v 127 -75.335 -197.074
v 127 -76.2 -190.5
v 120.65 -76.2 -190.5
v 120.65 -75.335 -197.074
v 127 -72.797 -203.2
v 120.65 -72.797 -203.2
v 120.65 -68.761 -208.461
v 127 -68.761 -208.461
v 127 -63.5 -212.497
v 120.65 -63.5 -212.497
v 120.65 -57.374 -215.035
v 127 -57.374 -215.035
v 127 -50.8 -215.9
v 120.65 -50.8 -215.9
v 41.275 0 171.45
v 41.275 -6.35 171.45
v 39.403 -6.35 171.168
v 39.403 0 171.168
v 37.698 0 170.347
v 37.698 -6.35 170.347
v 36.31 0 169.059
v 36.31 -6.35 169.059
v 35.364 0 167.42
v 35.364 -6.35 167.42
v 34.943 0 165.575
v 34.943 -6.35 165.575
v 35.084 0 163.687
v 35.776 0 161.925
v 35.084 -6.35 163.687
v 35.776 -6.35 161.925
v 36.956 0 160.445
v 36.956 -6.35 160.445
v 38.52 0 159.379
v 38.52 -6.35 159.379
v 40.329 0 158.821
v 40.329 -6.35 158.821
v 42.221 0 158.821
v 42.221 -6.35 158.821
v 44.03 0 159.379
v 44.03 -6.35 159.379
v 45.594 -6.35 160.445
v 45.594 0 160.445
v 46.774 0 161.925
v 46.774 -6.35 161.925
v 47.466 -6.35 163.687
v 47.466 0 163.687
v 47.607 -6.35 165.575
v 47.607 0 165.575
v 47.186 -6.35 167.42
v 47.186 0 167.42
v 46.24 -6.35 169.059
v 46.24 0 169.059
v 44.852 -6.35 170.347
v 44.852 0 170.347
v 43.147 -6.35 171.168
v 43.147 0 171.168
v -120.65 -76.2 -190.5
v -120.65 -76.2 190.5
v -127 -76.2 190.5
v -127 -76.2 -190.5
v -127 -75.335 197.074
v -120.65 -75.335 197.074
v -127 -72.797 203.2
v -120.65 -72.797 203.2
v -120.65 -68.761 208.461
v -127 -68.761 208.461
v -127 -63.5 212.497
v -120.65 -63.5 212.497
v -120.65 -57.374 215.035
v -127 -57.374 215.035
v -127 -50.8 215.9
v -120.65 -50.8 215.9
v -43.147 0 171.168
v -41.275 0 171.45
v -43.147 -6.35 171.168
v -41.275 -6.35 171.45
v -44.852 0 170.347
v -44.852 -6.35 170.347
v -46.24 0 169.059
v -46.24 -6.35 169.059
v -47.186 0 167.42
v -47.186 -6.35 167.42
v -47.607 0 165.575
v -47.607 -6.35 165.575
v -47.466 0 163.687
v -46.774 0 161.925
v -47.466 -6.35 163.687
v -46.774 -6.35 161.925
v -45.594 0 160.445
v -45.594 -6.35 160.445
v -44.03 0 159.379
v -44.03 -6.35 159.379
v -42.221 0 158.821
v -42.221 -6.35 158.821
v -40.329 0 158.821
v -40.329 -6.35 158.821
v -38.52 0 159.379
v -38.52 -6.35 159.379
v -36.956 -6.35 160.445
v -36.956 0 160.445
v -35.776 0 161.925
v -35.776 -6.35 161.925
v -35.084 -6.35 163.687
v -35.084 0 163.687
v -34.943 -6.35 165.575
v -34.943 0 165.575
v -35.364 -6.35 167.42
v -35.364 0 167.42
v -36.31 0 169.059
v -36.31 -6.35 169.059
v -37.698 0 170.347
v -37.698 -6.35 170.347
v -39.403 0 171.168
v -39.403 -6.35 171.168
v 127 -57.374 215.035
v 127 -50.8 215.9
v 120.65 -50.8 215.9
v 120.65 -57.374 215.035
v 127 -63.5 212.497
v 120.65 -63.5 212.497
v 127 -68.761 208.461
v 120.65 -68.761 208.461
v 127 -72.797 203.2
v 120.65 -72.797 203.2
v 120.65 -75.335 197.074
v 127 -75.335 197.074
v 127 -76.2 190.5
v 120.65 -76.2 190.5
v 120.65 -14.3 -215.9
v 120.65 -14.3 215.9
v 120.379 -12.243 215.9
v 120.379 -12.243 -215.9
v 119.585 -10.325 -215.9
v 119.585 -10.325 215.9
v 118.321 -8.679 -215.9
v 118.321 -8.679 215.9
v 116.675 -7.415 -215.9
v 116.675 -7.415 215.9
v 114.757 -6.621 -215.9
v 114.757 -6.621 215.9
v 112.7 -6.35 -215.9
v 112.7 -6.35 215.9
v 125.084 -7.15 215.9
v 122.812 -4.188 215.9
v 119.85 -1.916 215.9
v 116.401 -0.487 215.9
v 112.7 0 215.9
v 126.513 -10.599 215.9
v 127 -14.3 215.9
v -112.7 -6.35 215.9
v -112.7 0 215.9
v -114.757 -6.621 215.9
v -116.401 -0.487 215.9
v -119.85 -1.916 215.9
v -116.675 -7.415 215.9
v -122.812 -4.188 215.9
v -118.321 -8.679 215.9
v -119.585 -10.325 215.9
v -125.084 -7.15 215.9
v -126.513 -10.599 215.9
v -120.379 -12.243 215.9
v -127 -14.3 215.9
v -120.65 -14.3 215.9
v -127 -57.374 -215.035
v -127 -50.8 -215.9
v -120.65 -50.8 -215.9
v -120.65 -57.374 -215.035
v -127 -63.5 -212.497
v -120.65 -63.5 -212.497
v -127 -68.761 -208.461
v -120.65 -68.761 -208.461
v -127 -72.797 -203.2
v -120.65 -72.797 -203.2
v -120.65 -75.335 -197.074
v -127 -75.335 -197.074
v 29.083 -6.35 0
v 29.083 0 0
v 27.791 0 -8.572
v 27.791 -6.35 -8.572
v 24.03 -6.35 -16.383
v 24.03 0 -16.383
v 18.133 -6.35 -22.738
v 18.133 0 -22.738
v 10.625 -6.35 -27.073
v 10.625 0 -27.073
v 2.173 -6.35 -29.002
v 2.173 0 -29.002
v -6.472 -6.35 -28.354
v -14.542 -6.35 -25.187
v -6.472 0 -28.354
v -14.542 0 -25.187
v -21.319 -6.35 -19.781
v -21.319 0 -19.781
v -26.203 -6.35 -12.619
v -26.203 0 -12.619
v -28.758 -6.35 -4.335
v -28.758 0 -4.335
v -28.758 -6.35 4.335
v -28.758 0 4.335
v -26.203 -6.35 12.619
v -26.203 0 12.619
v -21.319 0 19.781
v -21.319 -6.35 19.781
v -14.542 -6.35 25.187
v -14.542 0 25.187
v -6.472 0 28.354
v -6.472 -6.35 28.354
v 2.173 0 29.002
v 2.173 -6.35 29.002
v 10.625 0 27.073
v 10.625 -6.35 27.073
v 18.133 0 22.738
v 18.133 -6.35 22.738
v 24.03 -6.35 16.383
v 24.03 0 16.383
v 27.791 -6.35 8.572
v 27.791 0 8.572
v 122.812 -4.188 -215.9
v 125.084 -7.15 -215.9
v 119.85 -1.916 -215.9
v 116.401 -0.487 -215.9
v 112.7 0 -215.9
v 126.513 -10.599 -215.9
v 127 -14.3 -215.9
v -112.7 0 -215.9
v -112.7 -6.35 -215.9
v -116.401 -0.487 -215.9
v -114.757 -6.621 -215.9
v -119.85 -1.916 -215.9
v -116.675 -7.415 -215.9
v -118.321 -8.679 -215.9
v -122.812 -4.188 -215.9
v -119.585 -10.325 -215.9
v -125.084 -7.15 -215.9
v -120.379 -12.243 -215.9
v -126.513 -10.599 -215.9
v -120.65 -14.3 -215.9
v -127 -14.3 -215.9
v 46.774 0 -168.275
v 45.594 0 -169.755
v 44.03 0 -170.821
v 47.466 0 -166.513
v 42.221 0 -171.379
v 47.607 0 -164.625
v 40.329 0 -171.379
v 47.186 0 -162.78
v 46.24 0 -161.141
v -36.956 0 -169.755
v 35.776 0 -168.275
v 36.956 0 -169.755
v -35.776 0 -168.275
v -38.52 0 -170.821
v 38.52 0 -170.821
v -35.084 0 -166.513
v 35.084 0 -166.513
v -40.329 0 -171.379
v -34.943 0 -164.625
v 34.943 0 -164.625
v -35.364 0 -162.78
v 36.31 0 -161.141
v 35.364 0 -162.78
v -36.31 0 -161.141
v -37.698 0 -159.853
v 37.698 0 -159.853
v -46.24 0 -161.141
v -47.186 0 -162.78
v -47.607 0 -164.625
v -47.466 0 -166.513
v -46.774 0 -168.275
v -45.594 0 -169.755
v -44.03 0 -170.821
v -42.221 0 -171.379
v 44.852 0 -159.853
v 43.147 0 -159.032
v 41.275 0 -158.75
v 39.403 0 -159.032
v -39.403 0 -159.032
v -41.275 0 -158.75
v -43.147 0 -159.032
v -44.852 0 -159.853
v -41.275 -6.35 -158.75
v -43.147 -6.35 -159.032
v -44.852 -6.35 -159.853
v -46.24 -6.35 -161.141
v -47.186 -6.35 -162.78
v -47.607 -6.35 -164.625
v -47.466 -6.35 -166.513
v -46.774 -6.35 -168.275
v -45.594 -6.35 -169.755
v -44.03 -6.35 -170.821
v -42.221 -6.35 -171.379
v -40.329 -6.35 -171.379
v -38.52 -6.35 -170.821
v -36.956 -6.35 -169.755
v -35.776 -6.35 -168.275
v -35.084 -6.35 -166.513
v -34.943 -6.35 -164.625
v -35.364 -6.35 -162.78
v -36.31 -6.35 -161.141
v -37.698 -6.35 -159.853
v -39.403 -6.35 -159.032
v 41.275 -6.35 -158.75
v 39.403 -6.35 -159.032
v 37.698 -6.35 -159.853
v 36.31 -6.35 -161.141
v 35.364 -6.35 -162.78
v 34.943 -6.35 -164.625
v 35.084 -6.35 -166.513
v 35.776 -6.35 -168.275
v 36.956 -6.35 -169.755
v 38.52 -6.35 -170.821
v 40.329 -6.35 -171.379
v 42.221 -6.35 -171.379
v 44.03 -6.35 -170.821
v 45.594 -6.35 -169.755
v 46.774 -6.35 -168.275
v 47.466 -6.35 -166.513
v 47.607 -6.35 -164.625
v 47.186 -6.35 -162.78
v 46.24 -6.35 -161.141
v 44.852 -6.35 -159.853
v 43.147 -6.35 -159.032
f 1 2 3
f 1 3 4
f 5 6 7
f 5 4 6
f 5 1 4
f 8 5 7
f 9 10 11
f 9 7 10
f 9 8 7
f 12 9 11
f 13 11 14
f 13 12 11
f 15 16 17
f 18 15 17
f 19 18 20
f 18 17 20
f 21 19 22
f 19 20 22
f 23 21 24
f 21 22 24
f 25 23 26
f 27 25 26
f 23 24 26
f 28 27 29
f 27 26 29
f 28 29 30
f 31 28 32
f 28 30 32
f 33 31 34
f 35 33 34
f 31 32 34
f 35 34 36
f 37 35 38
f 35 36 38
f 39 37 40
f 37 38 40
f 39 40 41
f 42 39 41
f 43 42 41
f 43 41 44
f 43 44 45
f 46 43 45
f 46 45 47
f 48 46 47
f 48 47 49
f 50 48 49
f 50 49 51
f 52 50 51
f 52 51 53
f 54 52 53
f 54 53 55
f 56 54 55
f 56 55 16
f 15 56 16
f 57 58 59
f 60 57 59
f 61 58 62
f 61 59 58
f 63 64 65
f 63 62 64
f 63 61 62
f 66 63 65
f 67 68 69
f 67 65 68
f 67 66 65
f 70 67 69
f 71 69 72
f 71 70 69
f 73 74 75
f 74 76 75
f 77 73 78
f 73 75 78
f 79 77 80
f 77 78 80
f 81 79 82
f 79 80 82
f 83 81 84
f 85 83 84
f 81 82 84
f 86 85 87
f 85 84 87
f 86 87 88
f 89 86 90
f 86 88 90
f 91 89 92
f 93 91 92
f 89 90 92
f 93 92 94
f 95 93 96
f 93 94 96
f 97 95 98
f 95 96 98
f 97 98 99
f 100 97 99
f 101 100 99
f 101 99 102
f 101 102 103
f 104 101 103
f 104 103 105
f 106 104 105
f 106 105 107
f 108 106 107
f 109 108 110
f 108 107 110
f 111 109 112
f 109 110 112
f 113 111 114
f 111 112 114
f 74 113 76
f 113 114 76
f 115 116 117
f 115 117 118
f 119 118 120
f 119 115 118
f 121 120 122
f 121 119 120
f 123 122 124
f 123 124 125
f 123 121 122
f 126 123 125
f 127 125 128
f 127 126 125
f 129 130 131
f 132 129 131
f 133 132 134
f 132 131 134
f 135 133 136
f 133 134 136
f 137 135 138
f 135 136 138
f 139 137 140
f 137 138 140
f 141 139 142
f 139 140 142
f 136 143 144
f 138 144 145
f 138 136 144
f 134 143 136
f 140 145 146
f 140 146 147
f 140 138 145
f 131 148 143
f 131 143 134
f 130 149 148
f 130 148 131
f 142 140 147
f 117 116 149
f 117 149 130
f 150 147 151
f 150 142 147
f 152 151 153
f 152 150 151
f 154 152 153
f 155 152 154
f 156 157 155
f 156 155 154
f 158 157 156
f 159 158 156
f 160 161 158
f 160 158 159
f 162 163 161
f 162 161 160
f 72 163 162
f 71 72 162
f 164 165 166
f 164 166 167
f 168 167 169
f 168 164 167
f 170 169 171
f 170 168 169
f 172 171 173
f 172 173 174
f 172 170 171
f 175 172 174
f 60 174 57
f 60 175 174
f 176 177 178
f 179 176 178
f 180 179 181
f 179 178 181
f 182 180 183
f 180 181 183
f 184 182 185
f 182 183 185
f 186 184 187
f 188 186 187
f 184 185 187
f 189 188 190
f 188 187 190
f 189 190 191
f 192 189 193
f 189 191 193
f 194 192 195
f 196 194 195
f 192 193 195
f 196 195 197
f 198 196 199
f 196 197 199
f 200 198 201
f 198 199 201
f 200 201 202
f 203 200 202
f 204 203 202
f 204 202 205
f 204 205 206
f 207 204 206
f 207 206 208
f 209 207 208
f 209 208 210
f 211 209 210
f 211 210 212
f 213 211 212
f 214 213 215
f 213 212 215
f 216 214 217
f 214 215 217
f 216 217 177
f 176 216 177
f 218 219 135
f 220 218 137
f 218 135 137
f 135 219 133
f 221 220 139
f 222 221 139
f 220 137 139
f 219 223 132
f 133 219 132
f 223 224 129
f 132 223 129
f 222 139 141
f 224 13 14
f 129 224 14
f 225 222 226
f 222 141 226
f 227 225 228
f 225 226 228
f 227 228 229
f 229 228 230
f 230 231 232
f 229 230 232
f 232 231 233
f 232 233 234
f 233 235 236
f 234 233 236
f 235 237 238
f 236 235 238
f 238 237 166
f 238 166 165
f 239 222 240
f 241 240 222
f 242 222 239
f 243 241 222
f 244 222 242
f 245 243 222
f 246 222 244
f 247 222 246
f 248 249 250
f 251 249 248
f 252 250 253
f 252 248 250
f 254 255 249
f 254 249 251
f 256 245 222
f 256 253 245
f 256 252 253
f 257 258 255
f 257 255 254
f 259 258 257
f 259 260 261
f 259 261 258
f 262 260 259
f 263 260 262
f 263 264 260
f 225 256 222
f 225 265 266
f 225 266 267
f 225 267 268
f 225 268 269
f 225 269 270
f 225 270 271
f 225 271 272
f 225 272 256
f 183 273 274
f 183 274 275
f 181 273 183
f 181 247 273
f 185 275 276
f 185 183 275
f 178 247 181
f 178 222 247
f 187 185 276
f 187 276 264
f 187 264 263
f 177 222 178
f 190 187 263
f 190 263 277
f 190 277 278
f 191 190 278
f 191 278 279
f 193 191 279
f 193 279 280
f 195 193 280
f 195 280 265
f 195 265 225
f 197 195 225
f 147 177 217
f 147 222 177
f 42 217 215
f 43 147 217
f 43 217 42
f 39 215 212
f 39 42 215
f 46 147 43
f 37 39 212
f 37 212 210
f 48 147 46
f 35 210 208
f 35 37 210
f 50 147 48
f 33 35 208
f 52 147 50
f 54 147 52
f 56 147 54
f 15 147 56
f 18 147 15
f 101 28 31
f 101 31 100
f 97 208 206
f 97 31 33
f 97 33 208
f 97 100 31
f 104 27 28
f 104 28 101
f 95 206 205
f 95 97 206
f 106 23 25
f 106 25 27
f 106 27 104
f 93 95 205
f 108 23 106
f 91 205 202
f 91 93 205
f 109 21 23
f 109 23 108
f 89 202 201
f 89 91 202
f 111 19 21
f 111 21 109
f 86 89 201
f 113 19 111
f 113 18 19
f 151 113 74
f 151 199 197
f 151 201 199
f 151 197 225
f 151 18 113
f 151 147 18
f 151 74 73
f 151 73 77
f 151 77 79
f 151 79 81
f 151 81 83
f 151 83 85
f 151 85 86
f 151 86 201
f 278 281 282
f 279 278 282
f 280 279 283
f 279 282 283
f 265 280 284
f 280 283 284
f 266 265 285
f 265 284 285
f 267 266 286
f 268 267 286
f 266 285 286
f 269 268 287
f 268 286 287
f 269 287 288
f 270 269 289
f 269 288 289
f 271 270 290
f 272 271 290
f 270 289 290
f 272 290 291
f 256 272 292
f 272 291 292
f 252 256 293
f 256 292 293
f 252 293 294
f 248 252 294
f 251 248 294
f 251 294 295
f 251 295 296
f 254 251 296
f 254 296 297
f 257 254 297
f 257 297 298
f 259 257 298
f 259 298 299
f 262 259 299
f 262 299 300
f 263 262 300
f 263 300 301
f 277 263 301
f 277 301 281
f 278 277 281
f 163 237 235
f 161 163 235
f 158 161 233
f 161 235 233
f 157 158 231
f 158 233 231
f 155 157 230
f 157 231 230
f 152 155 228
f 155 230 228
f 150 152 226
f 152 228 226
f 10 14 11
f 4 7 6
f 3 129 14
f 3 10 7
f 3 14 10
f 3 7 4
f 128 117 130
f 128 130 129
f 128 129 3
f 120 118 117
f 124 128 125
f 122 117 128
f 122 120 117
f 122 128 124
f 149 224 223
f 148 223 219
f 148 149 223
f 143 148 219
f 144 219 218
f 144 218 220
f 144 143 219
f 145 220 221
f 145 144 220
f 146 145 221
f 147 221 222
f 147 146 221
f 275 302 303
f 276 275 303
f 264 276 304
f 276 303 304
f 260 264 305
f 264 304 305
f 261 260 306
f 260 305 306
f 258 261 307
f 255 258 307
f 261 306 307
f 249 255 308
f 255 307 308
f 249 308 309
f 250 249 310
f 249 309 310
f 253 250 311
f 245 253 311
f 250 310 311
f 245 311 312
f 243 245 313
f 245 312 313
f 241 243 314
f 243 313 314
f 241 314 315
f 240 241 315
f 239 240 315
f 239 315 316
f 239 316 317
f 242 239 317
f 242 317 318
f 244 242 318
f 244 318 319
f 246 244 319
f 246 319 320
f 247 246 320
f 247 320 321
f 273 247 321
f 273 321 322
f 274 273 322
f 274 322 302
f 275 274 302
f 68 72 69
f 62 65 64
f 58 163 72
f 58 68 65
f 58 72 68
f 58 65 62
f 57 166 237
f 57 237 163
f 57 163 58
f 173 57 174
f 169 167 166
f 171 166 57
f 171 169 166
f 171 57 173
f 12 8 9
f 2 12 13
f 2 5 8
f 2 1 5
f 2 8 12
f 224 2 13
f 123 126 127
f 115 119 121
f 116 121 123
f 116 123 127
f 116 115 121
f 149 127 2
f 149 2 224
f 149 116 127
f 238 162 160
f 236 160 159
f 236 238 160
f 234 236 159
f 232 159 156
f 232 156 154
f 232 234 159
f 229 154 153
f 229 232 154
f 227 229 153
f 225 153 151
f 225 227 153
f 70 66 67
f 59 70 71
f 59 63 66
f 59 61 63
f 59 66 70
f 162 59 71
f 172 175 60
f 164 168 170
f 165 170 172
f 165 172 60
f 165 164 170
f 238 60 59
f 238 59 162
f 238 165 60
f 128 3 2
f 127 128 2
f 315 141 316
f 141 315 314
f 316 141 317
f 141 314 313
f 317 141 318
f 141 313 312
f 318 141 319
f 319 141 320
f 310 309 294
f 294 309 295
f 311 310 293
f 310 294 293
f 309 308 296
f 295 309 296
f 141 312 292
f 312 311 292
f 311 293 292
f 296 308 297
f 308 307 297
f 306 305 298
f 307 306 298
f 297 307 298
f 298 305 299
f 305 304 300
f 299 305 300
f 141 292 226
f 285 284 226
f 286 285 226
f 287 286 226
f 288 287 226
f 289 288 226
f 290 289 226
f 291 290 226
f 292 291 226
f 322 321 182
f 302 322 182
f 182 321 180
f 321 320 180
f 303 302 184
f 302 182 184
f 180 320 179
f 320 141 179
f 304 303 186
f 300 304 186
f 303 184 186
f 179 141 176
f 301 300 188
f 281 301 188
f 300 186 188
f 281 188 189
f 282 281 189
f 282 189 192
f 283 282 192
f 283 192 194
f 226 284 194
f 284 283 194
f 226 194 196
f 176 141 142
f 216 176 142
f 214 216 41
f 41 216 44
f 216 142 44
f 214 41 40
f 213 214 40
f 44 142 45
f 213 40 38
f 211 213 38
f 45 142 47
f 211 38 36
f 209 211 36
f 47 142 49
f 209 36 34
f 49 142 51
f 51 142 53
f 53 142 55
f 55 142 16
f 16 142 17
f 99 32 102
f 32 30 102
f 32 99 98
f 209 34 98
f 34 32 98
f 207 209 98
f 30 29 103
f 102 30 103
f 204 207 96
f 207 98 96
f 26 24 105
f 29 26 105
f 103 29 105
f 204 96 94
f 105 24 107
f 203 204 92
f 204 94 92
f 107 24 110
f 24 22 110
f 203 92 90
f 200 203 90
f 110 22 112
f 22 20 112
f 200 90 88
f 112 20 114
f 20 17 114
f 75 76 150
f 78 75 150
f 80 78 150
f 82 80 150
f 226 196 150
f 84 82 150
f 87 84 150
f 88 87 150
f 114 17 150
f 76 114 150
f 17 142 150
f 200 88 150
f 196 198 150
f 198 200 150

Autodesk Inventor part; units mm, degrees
ref_plane "YZ Plane" through (0, 0, 0) normal (1, 0, 0) x (0, 1, 0)
ref_plane "XZ Plane" through (0, 0, 0) normal (0, 1, 0) x (-1, 0, 0)
ref_plane "XY Plane" through (0, 0, 0) normal (0, 0, 1) x (1, 0, 0)
sketch "Sketch4" plane through (0, 0, 0) normal (0, 1, 0) x (-1, 0, 0)
  line L0 (-127, 215.9) -> (127, 215.9)
  line L1 (127, 215.9) -> (127, -215.9)
  line L2 (127, -215.9) -> (-127, -215.9)
  line L3 (-127, -215.9) -> (-127, 215.9)
  line L4 (-127, 215.9) -> (127, -215.9) construction
  line L5 (127, 215.9) -> (-127, -215.9) construction
  point P0 (0, 0)
  dimension "d6" = 431.8
  dimension "d7" = 254
extrude "Plate1" add sketch "Sketch4" against normal blind 6.35
sketch "Sketch5" plane through (120.65, 0, -215.9) normal (1, 0, 0) x (0, -1, 0)
  line L0 (0, 431.8) -> (0, 0)
  line L1 (0, 0) -> (76.2, 0)
  line L2 (76.2, 0) -> (76.2, 431.8)
  line L3 (76.2, 431.8) -> (0, 431.8)
edge flange "Flange1" height 76.2 angle 90 thickness 6.35 bend radius 7.9502 thickness toward (1, 0, 0) relief tear relief width 6.35 relief depth 3.175 corner gap 6.35 corner form 0 edges at (127, 0, 0) (-127, 0, 0) wall of the first edge with corners at (120.65, 0, 215.9) (120.65, 0, -215.9) (120.65, -76.2, -215.9) (120.65, -76.2, 215.9)
bend "Bend1"
corner "Corner1"
sketch "Sketch6" plane through (0, 0, 0) normal (0, 1, 0) x (1, 0, 0)
  circle A0 centre (0, 0) radius 29.083
  dimension "d19" = 58.166
extrude "Cut1" cut sketch "Sketch6" against normal blind 6.35
sketch "Sketch7" plane through (0, 0, 0) normal (0, 1, 0) x (1, 0, 0)
  line L0 (-41.275, -165.1) -> (41.275, -165.1)
  line L1 (41.275, -165.1) -> (41.275, 165.1)
  line L2 (41.275, 165.1) -> (-41.275, 165.1)
  line L3 (-41.275, 165.1) -> (-41.275, -165.1)
  line L4 (-41.275, -165.1) -> (41.275, 165.1) construction
  line L5 (41.275, -165.1) -> (-41.275, 165.1) construction
  line L6 (112.6998, 215.9) -> (-112.6998, 215.9) projected
  point P0 (0, 0)
  dimension "d22" = 82.55
  dimension "d23" = 50.8
hole "Hole1" at (-41.275, 0, 165.1) at (41.275, 0, 165.1) at (-41.275, 0, -165.1) at (41.275, 0, -165.1) direction (0, -1, 0) diameter 12.7 depth 6.35
fillet "Corner Round1" radius 25.4 4 edges at (-123.825, -76.2, 215.9) (123.825, -76.2, 215.9) (123.825, -76.2, -215.9) (-123.825, -76.2, -215.9)
equation "\"d20\" = Thickness"
equation "\"d29\" = Thickness"
equation "\"d8\" = Thickness"
equation "\"d9\" = BendReliefWidth"
equation "\"d10\" = BendReliefDepth"
equation "\"d11\" = MinimumRemnant"
equation "\"d12\" = TransitionRadius"
equation "\"d15\" = BendRadius"
equation "\"d16\" = CornerReliefSize"
equation "\"d17\" = GapSize"
equation "\"d18\" = JacobiRadiusSize"
equation "\"BendReliefWidth\" = Thickness"
equation "\"BendReliefDepth\" = 0.5 * Thickness"
equation "\"CornerReliefSize\" = 4 * Thickness"
equation "\"MinimumRemnant\" = 2 * Thickness"
equation "\"TransitionRadius\" = BendRadius"
equation "\"JacobiRadiusSize\" = Thickness"
equation "\"GapSize\" = Thickness"
equation "\"Thickness\" = 6.35"
equation "\"BendRadius\" = 7.9502"
properties part number "Gooseneck Model-1 Sheet-1" material "SS304"
